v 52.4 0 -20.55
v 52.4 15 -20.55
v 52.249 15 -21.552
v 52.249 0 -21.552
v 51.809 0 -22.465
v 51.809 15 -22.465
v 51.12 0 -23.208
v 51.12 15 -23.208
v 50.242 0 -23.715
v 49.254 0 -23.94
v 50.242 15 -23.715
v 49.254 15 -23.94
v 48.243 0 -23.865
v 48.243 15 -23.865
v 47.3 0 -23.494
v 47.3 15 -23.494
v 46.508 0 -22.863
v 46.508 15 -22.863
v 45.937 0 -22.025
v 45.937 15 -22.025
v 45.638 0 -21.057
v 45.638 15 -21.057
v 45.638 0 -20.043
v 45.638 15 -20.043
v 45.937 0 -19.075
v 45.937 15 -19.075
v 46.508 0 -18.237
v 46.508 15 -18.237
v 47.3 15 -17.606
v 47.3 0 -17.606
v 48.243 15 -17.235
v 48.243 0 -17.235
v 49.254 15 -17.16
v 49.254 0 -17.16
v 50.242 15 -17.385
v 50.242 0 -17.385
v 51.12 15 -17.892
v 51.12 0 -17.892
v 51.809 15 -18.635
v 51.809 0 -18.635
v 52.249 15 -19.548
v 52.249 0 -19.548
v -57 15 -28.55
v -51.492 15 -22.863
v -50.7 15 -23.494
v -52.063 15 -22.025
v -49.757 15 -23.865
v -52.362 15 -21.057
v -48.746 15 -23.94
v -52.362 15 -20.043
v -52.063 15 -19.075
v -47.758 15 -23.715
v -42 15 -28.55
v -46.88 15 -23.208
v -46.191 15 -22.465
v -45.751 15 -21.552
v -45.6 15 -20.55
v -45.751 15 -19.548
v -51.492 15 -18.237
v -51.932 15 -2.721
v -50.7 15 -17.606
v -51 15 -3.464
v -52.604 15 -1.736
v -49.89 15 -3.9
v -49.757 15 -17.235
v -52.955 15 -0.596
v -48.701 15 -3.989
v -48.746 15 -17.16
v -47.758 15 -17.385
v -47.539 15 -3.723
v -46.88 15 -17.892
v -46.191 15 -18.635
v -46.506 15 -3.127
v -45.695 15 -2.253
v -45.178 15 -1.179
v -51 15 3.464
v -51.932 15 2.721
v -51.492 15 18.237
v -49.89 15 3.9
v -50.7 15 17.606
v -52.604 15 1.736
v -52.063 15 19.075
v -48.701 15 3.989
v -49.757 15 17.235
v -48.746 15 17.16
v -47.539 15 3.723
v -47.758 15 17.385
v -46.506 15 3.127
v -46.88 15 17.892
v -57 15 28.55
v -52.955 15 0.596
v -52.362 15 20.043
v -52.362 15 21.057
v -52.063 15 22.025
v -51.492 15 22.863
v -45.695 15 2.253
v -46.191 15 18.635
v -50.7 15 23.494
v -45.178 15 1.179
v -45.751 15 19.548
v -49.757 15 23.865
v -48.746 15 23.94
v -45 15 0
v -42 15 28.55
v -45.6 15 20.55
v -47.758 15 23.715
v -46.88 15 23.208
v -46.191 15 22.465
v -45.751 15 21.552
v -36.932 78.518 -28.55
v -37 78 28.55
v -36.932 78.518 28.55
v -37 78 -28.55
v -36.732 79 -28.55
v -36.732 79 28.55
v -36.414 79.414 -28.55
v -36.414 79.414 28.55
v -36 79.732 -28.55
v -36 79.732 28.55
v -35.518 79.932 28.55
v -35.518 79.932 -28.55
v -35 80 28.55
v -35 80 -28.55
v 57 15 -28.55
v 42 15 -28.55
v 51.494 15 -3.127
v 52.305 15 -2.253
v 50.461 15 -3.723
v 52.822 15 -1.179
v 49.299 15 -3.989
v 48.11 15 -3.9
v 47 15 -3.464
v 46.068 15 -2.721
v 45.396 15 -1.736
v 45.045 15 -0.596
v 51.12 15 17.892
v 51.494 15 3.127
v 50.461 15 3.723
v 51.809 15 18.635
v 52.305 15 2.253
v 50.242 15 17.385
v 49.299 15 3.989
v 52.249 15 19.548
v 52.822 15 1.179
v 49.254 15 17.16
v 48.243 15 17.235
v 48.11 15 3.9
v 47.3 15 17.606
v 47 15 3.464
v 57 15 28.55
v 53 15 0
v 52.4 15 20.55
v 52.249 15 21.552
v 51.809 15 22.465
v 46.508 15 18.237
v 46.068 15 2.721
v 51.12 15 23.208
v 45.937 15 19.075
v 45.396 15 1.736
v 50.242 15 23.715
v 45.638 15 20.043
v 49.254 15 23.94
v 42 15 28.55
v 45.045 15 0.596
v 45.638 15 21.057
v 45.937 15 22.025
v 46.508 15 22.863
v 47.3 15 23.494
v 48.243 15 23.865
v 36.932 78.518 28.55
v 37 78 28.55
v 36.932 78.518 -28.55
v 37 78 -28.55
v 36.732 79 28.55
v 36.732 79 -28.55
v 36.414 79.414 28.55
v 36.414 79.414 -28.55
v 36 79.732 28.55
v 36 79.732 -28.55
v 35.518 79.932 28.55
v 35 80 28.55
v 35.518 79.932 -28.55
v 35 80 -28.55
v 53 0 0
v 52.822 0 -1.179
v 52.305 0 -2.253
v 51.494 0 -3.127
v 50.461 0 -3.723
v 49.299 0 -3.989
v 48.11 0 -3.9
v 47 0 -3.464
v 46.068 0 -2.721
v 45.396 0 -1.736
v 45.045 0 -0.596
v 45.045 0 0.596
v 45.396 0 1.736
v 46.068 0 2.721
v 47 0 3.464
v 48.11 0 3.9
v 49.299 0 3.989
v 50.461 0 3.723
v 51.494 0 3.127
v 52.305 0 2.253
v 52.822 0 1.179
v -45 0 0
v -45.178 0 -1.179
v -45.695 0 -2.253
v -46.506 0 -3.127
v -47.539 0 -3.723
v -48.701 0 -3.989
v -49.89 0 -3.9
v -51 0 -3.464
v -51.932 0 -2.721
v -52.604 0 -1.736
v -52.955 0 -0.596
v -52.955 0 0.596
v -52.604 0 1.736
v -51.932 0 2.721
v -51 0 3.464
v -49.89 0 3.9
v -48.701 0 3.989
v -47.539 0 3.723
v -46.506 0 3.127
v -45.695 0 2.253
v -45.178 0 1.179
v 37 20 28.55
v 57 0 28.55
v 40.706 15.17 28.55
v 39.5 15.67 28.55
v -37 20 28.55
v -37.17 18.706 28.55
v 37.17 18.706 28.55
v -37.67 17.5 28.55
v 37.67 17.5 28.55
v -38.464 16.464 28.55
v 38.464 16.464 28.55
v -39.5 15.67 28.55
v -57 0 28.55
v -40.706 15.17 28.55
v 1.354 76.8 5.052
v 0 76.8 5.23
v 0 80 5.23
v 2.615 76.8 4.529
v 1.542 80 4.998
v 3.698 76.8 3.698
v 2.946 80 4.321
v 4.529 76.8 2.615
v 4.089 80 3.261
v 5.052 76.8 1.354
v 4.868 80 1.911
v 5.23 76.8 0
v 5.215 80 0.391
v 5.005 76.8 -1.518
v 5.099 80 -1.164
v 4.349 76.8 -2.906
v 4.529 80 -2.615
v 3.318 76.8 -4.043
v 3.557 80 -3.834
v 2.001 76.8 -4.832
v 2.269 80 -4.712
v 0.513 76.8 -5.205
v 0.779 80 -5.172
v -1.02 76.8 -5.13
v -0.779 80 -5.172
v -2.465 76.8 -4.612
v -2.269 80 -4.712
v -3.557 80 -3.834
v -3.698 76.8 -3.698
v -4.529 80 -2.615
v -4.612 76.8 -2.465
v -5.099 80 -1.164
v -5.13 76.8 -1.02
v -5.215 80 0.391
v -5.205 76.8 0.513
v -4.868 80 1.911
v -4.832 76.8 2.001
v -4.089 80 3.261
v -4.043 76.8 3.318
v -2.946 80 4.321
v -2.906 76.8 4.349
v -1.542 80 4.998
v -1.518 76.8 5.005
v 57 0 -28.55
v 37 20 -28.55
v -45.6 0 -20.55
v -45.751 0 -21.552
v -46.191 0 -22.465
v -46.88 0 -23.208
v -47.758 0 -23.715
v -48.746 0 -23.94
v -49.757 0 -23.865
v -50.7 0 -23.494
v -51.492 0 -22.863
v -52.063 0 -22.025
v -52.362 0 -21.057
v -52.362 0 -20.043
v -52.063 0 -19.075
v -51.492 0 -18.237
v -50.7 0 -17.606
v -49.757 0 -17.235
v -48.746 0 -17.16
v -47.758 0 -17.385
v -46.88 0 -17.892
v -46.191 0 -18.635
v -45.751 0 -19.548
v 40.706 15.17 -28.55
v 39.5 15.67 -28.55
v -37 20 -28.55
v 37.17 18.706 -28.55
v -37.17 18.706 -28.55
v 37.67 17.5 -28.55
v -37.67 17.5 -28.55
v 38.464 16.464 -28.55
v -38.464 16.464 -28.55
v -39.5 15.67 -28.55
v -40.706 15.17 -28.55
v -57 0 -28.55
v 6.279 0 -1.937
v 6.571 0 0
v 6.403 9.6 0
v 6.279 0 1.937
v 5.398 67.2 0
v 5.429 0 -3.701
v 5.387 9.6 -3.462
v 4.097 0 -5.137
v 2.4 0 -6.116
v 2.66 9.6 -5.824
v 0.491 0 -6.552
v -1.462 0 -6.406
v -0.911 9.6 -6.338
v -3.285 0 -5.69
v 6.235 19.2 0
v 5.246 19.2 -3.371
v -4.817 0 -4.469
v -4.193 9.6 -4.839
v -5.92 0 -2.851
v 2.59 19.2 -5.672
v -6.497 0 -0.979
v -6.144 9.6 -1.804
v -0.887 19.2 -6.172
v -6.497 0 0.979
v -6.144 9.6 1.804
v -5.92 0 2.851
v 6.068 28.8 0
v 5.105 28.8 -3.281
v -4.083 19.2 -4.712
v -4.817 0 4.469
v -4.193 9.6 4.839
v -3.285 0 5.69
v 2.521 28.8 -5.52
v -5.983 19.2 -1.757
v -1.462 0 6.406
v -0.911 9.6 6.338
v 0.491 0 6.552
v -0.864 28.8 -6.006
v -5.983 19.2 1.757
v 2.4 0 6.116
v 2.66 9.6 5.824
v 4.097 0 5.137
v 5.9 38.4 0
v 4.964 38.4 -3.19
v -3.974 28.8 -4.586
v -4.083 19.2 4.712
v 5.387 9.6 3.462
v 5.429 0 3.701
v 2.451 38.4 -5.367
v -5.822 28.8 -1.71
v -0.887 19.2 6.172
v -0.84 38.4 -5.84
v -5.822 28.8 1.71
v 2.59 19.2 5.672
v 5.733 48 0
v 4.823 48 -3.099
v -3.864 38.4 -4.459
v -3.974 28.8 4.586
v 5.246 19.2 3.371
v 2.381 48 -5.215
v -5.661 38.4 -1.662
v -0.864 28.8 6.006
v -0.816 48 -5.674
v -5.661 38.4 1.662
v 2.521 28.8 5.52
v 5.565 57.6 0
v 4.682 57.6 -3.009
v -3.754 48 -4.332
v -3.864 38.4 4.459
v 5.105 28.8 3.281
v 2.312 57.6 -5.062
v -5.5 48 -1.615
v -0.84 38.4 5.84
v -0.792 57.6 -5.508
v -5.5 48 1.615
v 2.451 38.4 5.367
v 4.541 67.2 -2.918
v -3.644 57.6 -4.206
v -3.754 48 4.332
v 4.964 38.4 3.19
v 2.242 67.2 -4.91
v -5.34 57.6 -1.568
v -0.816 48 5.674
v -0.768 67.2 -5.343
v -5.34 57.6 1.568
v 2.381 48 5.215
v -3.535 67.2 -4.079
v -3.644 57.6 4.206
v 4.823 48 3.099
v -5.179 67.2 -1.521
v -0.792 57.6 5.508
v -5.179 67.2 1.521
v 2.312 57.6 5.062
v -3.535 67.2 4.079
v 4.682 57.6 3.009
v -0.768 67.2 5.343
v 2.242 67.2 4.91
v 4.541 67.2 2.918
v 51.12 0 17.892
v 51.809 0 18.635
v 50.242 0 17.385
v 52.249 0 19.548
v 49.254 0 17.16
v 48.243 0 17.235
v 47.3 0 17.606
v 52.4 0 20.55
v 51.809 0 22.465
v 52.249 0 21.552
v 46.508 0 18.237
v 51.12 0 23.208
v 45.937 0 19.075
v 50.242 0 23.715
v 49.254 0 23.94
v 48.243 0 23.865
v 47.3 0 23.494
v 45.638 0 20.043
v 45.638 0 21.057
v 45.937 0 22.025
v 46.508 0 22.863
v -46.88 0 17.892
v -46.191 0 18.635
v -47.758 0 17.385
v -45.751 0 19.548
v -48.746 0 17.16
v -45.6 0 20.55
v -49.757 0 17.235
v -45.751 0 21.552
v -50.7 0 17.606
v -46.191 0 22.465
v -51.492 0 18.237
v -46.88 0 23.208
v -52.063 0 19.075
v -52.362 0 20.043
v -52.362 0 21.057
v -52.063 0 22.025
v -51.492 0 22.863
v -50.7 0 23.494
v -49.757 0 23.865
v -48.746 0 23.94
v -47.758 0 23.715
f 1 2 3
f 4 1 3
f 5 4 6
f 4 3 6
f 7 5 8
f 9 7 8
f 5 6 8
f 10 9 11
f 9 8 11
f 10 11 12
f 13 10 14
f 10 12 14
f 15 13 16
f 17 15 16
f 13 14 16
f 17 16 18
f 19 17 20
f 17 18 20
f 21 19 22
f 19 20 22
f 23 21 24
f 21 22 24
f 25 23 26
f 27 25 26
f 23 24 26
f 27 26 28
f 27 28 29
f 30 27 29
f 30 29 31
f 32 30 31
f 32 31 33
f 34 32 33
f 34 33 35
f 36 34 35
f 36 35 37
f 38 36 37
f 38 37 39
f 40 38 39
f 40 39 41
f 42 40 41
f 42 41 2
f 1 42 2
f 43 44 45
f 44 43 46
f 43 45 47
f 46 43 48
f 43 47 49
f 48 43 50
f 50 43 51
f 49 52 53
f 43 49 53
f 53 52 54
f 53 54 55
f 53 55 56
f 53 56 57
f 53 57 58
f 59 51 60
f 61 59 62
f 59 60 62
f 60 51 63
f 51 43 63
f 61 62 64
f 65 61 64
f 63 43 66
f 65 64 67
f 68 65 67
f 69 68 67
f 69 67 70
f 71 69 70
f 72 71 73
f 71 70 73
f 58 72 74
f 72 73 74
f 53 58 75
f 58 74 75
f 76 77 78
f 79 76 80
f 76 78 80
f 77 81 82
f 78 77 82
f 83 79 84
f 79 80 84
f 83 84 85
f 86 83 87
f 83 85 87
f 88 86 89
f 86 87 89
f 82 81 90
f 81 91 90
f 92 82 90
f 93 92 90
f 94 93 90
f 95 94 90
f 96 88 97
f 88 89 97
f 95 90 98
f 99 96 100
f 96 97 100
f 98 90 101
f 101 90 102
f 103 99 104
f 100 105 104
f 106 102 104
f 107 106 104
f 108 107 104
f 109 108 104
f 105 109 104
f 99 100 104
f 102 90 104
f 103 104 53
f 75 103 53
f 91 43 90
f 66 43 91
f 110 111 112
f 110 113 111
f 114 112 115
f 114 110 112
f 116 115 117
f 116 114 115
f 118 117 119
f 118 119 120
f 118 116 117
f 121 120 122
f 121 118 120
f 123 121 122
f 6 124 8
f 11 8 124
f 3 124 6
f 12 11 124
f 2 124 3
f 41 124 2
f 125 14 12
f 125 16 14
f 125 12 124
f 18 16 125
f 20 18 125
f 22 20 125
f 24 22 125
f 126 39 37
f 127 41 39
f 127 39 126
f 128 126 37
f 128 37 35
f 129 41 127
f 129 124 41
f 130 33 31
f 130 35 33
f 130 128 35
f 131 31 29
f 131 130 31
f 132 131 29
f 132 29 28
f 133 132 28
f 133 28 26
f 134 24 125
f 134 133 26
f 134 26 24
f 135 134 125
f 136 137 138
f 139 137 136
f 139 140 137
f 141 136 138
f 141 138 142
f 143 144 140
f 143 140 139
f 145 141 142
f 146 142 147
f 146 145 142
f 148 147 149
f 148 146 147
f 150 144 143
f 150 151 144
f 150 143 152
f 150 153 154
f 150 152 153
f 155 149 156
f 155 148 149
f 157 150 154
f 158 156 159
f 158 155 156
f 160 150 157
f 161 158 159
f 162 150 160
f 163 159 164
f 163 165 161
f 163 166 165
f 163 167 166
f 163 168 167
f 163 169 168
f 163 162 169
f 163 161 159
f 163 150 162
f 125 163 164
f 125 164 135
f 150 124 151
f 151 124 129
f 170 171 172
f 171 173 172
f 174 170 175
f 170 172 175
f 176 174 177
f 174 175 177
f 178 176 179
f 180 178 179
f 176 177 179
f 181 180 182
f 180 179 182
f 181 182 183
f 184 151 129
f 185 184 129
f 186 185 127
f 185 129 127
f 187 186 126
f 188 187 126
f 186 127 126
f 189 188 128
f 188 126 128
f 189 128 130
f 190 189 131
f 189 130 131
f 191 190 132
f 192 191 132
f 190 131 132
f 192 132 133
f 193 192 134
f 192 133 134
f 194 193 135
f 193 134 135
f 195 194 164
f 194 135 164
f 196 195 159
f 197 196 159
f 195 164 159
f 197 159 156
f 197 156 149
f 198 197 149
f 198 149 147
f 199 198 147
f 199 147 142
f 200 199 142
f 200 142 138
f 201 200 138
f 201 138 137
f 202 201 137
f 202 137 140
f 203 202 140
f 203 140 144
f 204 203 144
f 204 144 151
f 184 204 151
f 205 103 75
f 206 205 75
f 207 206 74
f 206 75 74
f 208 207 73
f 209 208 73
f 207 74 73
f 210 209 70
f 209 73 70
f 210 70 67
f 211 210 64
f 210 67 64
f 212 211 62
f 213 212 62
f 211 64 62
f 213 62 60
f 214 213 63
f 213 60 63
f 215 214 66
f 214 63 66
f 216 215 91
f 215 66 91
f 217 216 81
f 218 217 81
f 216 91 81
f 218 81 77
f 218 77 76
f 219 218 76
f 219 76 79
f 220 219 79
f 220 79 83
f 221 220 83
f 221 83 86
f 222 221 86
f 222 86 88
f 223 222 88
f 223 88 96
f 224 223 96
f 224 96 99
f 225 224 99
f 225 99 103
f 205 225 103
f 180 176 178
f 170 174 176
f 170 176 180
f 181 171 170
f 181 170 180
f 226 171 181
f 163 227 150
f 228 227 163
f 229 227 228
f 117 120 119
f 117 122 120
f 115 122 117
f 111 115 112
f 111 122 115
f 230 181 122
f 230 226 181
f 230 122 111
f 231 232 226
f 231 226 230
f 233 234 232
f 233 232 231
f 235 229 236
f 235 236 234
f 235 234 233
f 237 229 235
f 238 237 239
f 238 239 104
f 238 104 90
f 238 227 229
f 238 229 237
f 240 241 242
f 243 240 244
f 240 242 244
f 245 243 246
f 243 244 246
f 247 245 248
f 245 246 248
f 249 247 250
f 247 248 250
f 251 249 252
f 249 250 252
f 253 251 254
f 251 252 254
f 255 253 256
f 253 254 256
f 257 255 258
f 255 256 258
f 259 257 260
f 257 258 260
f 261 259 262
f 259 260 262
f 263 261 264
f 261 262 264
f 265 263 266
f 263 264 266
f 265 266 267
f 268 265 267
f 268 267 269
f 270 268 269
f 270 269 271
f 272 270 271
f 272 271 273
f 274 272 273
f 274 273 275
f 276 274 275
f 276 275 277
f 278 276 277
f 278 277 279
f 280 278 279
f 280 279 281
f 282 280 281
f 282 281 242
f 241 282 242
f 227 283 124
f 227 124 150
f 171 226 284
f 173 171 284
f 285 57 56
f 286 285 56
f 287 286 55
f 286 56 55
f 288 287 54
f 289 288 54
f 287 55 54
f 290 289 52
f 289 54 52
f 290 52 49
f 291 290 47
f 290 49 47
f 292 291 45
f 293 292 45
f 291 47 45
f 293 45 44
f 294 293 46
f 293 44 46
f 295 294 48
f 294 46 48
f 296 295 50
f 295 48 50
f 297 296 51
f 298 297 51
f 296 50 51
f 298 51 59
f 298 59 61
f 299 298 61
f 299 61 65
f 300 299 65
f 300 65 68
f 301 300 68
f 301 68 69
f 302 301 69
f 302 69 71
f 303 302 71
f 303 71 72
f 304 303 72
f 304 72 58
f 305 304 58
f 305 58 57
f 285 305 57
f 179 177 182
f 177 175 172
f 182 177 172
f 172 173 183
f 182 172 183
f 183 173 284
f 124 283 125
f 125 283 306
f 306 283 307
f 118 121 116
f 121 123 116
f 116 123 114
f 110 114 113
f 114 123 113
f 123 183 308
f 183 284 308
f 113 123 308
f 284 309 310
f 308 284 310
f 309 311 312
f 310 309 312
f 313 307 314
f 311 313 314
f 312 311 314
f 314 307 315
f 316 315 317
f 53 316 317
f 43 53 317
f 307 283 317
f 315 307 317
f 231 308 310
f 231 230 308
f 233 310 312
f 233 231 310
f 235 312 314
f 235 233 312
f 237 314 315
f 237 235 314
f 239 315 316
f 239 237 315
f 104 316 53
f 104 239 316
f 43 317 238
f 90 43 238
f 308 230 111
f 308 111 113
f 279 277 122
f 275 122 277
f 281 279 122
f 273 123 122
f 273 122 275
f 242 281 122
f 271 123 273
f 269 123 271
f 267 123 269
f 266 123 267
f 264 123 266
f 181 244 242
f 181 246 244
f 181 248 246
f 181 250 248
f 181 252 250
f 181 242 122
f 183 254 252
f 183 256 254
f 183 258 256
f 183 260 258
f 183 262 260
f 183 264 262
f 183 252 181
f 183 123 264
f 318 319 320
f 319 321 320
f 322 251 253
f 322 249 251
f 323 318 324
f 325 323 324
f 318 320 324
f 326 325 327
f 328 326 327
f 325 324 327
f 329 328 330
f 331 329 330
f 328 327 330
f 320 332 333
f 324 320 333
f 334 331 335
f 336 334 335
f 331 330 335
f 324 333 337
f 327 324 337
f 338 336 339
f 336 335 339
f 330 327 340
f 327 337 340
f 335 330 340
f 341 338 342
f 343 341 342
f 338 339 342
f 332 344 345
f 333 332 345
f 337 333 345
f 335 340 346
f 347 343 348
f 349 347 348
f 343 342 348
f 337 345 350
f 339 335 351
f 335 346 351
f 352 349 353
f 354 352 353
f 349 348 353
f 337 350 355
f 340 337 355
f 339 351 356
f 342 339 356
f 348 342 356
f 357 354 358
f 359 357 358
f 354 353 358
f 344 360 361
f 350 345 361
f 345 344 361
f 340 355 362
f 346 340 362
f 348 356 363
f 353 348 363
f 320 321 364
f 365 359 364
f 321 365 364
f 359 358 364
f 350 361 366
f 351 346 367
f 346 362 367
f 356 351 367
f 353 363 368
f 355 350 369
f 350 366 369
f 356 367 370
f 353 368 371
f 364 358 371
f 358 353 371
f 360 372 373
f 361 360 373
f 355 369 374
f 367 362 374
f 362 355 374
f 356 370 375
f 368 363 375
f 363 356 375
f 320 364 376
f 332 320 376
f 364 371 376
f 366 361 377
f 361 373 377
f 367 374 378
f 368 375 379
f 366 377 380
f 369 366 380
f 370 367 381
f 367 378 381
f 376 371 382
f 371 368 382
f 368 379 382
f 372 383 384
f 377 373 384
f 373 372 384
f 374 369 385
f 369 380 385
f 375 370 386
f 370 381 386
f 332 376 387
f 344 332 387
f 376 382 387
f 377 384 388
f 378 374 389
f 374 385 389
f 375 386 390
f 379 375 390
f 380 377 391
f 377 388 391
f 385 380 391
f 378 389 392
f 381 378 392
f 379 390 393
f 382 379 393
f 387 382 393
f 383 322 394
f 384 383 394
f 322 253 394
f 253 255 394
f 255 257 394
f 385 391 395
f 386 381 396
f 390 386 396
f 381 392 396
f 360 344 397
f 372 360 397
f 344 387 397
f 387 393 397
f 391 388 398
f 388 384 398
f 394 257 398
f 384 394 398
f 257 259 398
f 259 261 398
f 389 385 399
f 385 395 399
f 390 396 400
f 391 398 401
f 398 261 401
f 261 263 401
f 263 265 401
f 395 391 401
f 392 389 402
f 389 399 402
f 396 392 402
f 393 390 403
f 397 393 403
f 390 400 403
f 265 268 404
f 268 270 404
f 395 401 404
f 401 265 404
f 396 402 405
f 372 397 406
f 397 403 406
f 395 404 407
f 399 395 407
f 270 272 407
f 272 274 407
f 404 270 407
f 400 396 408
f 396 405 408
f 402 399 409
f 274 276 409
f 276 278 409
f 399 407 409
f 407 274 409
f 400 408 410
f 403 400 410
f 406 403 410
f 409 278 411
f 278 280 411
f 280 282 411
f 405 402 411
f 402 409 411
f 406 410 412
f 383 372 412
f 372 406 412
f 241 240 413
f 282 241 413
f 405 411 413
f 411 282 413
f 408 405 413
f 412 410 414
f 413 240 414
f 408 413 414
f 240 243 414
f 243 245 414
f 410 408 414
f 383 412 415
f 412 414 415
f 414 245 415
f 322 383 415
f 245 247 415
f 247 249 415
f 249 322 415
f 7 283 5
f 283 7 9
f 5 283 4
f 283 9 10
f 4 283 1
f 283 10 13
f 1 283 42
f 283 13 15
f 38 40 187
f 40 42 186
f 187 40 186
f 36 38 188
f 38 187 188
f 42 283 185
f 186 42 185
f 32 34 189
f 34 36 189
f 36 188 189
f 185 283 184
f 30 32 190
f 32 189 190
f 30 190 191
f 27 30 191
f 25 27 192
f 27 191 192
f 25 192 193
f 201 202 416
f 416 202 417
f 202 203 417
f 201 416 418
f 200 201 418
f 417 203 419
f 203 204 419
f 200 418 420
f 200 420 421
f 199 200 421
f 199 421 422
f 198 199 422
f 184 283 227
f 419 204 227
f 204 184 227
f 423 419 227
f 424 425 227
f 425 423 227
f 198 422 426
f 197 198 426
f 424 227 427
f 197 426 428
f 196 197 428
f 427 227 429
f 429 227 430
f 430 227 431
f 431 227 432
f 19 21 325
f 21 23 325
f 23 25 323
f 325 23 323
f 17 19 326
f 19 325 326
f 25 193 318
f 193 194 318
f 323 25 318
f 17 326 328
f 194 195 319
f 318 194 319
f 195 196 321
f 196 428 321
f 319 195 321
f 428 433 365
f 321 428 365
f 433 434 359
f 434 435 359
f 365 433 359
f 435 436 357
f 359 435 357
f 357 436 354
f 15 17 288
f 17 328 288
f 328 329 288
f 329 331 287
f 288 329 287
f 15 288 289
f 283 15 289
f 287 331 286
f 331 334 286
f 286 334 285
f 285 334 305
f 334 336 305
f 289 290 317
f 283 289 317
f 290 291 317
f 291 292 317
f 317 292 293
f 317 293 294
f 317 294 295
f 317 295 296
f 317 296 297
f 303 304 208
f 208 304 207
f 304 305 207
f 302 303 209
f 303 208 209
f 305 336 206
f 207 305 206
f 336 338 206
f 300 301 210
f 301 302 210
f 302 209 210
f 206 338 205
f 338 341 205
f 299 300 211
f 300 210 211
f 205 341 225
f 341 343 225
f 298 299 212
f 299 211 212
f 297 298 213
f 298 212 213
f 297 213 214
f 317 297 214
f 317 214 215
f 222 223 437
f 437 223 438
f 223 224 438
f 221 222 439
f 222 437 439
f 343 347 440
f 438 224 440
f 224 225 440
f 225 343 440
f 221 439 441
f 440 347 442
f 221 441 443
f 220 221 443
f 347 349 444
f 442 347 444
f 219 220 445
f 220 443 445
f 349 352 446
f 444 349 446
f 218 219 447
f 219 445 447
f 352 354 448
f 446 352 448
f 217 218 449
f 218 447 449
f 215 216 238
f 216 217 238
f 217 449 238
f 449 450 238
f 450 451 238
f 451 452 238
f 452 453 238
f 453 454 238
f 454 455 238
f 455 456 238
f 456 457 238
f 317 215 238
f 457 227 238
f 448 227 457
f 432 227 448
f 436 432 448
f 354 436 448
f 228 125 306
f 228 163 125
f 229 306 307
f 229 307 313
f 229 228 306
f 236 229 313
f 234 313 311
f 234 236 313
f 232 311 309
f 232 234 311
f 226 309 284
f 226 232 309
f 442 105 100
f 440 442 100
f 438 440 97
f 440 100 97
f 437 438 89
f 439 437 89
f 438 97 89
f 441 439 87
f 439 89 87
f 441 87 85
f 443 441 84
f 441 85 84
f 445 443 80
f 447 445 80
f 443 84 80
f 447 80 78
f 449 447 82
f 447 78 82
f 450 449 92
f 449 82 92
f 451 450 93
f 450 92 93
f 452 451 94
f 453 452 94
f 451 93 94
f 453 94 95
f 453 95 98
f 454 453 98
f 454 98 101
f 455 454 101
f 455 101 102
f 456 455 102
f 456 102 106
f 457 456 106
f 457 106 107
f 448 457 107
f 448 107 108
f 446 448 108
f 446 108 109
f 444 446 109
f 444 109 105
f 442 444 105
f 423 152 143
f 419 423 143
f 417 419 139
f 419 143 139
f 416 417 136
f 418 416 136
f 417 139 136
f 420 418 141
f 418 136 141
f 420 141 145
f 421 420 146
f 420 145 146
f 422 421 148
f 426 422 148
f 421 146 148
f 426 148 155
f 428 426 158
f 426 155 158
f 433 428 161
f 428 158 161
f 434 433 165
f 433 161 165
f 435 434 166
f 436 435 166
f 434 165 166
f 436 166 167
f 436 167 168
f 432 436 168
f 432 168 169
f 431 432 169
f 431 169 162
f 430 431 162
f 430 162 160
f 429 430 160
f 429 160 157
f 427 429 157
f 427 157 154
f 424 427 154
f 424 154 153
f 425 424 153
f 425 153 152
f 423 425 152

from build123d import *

# Parameters (mm, degrees)
SKETCH1_W             = 74
SKETCH1_H             = 57.1
BOSS_EXTRUDE1_DEPTH   = 80
FILLET1_R             = 2
CUT_EXTRUDE1_REACH    = 94.65
SKETCH2_R             = 5.23
SKETCH7_W             = 20
SKETCH7_H             = 57.1
BOSS_EXTRUDE2_DEPTH   = 15
M8_TAPPED_HOLE1_D     = 6.8
FILLET2_R             = 5
F_8_0MM_DOWEL_HOLE1_D = 8


# Read off the part's stored shape, not the designer's step: Draft1
with BuildPart() as part:
    # Sketch1 → Boss-Extrude1 (new body)
    with BuildSketch(Plane(origin=(0, 0, 0), x_dir=(1, 0, 0), z_dir=(0, 1, 0))):
        Rectangle(SKETCH1_W, SKETCH1_H)
    extrude(amount=BOSS_EXTRUDE1_DEPTH)

    # Fillet1
    fillet1_edges = [part.edges().sort_by_distance(p)[0] for p in [
        (-37, 80, 0),
        (37, 80, 0),
    ]]
    fillet(fillet1_edges, radius=FILLET1_R)

    # Sketch2 → Cut-Extrude1 (cut, up to next)
    with BuildSketch(Plane(origin=(0, 80, 0), x_dir=(1, 0, 0), z_dir=(0, 1, 0)), mode=Mode.PRIVATE) as cut_extrude1_sk1:
        with Locations(Location((0, 0, 0), (0, 0, 270))):
            Circle(SKETCH2_R)
    cut_extrude1_tool1 = extrude(cut_extrude1_sk1.sketch, amount=-CUT_EXTRUDE1_REACH, mode=Mode.PRIVATE) & part.part
    add(cut_extrude1_tool1.solids().sort_by_distance((0, 80, 0))[0], mode=Mode.SUBTRACT)

    # Draft1 outline → Draft1 (revolve, cut)
    with BuildSketch(Plane.XY):
        Polygon((6.570548986, 0), (5.23, 76.8), (5.23, 0), align=None)
    revolve(axis=Axis((0, 0, 0), (0, 1, 0)), mode=Mode.SUBTRACT)

    # Sketch7 → Boss-Extrude2 (add)
    with BuildSketch(Plane.XZ):
        with Locations((-47, 0)):
            Rectangle(SKETCH7_W, SKETCH7_H)
    boss_extrude2 = extrude(amount=-BOSS_EXTRUDE2_DEPTH)

    # Mirror1: Boss-Extrude2 across plane
    add(boss_extrude2.mirror(Plane(origin=(0, 0, 0), x_dir=(0, 0, 1), z_dir=(1, 0, 0))))

    # M8 Tapped Hole1 (through all)
    with Locations(Plane(origin=(0, 0, 0), x_dir=(-1, 0, 0), z_dir=(0, -1, 0))):
        with Locations((-49, 20.55), (49, 20.55), (49, -20.55), (-49, -20.55)):
            Hole(M8_TAPPED_HOLE1_D / 2)

    # Fillet2
    fillet2_edges = [part.edges().sort_by_distance(p)[0] for p in [
        (-37, 15, 0),
        (37, 15, 0),
    ]]
    fillet(fillet2_edges, radius=FILLET2_R)

    # Ø8.0mm Dowel Hole1 (through all)
    with Locations(Plane(origin=(0, 0, 0), x_dir=(-1, 0, 0), z_dir=(0, -1, 0))):
        with Locations((-49, 0), (49, 0)):
            Hole(F_8_0MM_DOWEL_HOLE1_D / 2)


solid = part.part
